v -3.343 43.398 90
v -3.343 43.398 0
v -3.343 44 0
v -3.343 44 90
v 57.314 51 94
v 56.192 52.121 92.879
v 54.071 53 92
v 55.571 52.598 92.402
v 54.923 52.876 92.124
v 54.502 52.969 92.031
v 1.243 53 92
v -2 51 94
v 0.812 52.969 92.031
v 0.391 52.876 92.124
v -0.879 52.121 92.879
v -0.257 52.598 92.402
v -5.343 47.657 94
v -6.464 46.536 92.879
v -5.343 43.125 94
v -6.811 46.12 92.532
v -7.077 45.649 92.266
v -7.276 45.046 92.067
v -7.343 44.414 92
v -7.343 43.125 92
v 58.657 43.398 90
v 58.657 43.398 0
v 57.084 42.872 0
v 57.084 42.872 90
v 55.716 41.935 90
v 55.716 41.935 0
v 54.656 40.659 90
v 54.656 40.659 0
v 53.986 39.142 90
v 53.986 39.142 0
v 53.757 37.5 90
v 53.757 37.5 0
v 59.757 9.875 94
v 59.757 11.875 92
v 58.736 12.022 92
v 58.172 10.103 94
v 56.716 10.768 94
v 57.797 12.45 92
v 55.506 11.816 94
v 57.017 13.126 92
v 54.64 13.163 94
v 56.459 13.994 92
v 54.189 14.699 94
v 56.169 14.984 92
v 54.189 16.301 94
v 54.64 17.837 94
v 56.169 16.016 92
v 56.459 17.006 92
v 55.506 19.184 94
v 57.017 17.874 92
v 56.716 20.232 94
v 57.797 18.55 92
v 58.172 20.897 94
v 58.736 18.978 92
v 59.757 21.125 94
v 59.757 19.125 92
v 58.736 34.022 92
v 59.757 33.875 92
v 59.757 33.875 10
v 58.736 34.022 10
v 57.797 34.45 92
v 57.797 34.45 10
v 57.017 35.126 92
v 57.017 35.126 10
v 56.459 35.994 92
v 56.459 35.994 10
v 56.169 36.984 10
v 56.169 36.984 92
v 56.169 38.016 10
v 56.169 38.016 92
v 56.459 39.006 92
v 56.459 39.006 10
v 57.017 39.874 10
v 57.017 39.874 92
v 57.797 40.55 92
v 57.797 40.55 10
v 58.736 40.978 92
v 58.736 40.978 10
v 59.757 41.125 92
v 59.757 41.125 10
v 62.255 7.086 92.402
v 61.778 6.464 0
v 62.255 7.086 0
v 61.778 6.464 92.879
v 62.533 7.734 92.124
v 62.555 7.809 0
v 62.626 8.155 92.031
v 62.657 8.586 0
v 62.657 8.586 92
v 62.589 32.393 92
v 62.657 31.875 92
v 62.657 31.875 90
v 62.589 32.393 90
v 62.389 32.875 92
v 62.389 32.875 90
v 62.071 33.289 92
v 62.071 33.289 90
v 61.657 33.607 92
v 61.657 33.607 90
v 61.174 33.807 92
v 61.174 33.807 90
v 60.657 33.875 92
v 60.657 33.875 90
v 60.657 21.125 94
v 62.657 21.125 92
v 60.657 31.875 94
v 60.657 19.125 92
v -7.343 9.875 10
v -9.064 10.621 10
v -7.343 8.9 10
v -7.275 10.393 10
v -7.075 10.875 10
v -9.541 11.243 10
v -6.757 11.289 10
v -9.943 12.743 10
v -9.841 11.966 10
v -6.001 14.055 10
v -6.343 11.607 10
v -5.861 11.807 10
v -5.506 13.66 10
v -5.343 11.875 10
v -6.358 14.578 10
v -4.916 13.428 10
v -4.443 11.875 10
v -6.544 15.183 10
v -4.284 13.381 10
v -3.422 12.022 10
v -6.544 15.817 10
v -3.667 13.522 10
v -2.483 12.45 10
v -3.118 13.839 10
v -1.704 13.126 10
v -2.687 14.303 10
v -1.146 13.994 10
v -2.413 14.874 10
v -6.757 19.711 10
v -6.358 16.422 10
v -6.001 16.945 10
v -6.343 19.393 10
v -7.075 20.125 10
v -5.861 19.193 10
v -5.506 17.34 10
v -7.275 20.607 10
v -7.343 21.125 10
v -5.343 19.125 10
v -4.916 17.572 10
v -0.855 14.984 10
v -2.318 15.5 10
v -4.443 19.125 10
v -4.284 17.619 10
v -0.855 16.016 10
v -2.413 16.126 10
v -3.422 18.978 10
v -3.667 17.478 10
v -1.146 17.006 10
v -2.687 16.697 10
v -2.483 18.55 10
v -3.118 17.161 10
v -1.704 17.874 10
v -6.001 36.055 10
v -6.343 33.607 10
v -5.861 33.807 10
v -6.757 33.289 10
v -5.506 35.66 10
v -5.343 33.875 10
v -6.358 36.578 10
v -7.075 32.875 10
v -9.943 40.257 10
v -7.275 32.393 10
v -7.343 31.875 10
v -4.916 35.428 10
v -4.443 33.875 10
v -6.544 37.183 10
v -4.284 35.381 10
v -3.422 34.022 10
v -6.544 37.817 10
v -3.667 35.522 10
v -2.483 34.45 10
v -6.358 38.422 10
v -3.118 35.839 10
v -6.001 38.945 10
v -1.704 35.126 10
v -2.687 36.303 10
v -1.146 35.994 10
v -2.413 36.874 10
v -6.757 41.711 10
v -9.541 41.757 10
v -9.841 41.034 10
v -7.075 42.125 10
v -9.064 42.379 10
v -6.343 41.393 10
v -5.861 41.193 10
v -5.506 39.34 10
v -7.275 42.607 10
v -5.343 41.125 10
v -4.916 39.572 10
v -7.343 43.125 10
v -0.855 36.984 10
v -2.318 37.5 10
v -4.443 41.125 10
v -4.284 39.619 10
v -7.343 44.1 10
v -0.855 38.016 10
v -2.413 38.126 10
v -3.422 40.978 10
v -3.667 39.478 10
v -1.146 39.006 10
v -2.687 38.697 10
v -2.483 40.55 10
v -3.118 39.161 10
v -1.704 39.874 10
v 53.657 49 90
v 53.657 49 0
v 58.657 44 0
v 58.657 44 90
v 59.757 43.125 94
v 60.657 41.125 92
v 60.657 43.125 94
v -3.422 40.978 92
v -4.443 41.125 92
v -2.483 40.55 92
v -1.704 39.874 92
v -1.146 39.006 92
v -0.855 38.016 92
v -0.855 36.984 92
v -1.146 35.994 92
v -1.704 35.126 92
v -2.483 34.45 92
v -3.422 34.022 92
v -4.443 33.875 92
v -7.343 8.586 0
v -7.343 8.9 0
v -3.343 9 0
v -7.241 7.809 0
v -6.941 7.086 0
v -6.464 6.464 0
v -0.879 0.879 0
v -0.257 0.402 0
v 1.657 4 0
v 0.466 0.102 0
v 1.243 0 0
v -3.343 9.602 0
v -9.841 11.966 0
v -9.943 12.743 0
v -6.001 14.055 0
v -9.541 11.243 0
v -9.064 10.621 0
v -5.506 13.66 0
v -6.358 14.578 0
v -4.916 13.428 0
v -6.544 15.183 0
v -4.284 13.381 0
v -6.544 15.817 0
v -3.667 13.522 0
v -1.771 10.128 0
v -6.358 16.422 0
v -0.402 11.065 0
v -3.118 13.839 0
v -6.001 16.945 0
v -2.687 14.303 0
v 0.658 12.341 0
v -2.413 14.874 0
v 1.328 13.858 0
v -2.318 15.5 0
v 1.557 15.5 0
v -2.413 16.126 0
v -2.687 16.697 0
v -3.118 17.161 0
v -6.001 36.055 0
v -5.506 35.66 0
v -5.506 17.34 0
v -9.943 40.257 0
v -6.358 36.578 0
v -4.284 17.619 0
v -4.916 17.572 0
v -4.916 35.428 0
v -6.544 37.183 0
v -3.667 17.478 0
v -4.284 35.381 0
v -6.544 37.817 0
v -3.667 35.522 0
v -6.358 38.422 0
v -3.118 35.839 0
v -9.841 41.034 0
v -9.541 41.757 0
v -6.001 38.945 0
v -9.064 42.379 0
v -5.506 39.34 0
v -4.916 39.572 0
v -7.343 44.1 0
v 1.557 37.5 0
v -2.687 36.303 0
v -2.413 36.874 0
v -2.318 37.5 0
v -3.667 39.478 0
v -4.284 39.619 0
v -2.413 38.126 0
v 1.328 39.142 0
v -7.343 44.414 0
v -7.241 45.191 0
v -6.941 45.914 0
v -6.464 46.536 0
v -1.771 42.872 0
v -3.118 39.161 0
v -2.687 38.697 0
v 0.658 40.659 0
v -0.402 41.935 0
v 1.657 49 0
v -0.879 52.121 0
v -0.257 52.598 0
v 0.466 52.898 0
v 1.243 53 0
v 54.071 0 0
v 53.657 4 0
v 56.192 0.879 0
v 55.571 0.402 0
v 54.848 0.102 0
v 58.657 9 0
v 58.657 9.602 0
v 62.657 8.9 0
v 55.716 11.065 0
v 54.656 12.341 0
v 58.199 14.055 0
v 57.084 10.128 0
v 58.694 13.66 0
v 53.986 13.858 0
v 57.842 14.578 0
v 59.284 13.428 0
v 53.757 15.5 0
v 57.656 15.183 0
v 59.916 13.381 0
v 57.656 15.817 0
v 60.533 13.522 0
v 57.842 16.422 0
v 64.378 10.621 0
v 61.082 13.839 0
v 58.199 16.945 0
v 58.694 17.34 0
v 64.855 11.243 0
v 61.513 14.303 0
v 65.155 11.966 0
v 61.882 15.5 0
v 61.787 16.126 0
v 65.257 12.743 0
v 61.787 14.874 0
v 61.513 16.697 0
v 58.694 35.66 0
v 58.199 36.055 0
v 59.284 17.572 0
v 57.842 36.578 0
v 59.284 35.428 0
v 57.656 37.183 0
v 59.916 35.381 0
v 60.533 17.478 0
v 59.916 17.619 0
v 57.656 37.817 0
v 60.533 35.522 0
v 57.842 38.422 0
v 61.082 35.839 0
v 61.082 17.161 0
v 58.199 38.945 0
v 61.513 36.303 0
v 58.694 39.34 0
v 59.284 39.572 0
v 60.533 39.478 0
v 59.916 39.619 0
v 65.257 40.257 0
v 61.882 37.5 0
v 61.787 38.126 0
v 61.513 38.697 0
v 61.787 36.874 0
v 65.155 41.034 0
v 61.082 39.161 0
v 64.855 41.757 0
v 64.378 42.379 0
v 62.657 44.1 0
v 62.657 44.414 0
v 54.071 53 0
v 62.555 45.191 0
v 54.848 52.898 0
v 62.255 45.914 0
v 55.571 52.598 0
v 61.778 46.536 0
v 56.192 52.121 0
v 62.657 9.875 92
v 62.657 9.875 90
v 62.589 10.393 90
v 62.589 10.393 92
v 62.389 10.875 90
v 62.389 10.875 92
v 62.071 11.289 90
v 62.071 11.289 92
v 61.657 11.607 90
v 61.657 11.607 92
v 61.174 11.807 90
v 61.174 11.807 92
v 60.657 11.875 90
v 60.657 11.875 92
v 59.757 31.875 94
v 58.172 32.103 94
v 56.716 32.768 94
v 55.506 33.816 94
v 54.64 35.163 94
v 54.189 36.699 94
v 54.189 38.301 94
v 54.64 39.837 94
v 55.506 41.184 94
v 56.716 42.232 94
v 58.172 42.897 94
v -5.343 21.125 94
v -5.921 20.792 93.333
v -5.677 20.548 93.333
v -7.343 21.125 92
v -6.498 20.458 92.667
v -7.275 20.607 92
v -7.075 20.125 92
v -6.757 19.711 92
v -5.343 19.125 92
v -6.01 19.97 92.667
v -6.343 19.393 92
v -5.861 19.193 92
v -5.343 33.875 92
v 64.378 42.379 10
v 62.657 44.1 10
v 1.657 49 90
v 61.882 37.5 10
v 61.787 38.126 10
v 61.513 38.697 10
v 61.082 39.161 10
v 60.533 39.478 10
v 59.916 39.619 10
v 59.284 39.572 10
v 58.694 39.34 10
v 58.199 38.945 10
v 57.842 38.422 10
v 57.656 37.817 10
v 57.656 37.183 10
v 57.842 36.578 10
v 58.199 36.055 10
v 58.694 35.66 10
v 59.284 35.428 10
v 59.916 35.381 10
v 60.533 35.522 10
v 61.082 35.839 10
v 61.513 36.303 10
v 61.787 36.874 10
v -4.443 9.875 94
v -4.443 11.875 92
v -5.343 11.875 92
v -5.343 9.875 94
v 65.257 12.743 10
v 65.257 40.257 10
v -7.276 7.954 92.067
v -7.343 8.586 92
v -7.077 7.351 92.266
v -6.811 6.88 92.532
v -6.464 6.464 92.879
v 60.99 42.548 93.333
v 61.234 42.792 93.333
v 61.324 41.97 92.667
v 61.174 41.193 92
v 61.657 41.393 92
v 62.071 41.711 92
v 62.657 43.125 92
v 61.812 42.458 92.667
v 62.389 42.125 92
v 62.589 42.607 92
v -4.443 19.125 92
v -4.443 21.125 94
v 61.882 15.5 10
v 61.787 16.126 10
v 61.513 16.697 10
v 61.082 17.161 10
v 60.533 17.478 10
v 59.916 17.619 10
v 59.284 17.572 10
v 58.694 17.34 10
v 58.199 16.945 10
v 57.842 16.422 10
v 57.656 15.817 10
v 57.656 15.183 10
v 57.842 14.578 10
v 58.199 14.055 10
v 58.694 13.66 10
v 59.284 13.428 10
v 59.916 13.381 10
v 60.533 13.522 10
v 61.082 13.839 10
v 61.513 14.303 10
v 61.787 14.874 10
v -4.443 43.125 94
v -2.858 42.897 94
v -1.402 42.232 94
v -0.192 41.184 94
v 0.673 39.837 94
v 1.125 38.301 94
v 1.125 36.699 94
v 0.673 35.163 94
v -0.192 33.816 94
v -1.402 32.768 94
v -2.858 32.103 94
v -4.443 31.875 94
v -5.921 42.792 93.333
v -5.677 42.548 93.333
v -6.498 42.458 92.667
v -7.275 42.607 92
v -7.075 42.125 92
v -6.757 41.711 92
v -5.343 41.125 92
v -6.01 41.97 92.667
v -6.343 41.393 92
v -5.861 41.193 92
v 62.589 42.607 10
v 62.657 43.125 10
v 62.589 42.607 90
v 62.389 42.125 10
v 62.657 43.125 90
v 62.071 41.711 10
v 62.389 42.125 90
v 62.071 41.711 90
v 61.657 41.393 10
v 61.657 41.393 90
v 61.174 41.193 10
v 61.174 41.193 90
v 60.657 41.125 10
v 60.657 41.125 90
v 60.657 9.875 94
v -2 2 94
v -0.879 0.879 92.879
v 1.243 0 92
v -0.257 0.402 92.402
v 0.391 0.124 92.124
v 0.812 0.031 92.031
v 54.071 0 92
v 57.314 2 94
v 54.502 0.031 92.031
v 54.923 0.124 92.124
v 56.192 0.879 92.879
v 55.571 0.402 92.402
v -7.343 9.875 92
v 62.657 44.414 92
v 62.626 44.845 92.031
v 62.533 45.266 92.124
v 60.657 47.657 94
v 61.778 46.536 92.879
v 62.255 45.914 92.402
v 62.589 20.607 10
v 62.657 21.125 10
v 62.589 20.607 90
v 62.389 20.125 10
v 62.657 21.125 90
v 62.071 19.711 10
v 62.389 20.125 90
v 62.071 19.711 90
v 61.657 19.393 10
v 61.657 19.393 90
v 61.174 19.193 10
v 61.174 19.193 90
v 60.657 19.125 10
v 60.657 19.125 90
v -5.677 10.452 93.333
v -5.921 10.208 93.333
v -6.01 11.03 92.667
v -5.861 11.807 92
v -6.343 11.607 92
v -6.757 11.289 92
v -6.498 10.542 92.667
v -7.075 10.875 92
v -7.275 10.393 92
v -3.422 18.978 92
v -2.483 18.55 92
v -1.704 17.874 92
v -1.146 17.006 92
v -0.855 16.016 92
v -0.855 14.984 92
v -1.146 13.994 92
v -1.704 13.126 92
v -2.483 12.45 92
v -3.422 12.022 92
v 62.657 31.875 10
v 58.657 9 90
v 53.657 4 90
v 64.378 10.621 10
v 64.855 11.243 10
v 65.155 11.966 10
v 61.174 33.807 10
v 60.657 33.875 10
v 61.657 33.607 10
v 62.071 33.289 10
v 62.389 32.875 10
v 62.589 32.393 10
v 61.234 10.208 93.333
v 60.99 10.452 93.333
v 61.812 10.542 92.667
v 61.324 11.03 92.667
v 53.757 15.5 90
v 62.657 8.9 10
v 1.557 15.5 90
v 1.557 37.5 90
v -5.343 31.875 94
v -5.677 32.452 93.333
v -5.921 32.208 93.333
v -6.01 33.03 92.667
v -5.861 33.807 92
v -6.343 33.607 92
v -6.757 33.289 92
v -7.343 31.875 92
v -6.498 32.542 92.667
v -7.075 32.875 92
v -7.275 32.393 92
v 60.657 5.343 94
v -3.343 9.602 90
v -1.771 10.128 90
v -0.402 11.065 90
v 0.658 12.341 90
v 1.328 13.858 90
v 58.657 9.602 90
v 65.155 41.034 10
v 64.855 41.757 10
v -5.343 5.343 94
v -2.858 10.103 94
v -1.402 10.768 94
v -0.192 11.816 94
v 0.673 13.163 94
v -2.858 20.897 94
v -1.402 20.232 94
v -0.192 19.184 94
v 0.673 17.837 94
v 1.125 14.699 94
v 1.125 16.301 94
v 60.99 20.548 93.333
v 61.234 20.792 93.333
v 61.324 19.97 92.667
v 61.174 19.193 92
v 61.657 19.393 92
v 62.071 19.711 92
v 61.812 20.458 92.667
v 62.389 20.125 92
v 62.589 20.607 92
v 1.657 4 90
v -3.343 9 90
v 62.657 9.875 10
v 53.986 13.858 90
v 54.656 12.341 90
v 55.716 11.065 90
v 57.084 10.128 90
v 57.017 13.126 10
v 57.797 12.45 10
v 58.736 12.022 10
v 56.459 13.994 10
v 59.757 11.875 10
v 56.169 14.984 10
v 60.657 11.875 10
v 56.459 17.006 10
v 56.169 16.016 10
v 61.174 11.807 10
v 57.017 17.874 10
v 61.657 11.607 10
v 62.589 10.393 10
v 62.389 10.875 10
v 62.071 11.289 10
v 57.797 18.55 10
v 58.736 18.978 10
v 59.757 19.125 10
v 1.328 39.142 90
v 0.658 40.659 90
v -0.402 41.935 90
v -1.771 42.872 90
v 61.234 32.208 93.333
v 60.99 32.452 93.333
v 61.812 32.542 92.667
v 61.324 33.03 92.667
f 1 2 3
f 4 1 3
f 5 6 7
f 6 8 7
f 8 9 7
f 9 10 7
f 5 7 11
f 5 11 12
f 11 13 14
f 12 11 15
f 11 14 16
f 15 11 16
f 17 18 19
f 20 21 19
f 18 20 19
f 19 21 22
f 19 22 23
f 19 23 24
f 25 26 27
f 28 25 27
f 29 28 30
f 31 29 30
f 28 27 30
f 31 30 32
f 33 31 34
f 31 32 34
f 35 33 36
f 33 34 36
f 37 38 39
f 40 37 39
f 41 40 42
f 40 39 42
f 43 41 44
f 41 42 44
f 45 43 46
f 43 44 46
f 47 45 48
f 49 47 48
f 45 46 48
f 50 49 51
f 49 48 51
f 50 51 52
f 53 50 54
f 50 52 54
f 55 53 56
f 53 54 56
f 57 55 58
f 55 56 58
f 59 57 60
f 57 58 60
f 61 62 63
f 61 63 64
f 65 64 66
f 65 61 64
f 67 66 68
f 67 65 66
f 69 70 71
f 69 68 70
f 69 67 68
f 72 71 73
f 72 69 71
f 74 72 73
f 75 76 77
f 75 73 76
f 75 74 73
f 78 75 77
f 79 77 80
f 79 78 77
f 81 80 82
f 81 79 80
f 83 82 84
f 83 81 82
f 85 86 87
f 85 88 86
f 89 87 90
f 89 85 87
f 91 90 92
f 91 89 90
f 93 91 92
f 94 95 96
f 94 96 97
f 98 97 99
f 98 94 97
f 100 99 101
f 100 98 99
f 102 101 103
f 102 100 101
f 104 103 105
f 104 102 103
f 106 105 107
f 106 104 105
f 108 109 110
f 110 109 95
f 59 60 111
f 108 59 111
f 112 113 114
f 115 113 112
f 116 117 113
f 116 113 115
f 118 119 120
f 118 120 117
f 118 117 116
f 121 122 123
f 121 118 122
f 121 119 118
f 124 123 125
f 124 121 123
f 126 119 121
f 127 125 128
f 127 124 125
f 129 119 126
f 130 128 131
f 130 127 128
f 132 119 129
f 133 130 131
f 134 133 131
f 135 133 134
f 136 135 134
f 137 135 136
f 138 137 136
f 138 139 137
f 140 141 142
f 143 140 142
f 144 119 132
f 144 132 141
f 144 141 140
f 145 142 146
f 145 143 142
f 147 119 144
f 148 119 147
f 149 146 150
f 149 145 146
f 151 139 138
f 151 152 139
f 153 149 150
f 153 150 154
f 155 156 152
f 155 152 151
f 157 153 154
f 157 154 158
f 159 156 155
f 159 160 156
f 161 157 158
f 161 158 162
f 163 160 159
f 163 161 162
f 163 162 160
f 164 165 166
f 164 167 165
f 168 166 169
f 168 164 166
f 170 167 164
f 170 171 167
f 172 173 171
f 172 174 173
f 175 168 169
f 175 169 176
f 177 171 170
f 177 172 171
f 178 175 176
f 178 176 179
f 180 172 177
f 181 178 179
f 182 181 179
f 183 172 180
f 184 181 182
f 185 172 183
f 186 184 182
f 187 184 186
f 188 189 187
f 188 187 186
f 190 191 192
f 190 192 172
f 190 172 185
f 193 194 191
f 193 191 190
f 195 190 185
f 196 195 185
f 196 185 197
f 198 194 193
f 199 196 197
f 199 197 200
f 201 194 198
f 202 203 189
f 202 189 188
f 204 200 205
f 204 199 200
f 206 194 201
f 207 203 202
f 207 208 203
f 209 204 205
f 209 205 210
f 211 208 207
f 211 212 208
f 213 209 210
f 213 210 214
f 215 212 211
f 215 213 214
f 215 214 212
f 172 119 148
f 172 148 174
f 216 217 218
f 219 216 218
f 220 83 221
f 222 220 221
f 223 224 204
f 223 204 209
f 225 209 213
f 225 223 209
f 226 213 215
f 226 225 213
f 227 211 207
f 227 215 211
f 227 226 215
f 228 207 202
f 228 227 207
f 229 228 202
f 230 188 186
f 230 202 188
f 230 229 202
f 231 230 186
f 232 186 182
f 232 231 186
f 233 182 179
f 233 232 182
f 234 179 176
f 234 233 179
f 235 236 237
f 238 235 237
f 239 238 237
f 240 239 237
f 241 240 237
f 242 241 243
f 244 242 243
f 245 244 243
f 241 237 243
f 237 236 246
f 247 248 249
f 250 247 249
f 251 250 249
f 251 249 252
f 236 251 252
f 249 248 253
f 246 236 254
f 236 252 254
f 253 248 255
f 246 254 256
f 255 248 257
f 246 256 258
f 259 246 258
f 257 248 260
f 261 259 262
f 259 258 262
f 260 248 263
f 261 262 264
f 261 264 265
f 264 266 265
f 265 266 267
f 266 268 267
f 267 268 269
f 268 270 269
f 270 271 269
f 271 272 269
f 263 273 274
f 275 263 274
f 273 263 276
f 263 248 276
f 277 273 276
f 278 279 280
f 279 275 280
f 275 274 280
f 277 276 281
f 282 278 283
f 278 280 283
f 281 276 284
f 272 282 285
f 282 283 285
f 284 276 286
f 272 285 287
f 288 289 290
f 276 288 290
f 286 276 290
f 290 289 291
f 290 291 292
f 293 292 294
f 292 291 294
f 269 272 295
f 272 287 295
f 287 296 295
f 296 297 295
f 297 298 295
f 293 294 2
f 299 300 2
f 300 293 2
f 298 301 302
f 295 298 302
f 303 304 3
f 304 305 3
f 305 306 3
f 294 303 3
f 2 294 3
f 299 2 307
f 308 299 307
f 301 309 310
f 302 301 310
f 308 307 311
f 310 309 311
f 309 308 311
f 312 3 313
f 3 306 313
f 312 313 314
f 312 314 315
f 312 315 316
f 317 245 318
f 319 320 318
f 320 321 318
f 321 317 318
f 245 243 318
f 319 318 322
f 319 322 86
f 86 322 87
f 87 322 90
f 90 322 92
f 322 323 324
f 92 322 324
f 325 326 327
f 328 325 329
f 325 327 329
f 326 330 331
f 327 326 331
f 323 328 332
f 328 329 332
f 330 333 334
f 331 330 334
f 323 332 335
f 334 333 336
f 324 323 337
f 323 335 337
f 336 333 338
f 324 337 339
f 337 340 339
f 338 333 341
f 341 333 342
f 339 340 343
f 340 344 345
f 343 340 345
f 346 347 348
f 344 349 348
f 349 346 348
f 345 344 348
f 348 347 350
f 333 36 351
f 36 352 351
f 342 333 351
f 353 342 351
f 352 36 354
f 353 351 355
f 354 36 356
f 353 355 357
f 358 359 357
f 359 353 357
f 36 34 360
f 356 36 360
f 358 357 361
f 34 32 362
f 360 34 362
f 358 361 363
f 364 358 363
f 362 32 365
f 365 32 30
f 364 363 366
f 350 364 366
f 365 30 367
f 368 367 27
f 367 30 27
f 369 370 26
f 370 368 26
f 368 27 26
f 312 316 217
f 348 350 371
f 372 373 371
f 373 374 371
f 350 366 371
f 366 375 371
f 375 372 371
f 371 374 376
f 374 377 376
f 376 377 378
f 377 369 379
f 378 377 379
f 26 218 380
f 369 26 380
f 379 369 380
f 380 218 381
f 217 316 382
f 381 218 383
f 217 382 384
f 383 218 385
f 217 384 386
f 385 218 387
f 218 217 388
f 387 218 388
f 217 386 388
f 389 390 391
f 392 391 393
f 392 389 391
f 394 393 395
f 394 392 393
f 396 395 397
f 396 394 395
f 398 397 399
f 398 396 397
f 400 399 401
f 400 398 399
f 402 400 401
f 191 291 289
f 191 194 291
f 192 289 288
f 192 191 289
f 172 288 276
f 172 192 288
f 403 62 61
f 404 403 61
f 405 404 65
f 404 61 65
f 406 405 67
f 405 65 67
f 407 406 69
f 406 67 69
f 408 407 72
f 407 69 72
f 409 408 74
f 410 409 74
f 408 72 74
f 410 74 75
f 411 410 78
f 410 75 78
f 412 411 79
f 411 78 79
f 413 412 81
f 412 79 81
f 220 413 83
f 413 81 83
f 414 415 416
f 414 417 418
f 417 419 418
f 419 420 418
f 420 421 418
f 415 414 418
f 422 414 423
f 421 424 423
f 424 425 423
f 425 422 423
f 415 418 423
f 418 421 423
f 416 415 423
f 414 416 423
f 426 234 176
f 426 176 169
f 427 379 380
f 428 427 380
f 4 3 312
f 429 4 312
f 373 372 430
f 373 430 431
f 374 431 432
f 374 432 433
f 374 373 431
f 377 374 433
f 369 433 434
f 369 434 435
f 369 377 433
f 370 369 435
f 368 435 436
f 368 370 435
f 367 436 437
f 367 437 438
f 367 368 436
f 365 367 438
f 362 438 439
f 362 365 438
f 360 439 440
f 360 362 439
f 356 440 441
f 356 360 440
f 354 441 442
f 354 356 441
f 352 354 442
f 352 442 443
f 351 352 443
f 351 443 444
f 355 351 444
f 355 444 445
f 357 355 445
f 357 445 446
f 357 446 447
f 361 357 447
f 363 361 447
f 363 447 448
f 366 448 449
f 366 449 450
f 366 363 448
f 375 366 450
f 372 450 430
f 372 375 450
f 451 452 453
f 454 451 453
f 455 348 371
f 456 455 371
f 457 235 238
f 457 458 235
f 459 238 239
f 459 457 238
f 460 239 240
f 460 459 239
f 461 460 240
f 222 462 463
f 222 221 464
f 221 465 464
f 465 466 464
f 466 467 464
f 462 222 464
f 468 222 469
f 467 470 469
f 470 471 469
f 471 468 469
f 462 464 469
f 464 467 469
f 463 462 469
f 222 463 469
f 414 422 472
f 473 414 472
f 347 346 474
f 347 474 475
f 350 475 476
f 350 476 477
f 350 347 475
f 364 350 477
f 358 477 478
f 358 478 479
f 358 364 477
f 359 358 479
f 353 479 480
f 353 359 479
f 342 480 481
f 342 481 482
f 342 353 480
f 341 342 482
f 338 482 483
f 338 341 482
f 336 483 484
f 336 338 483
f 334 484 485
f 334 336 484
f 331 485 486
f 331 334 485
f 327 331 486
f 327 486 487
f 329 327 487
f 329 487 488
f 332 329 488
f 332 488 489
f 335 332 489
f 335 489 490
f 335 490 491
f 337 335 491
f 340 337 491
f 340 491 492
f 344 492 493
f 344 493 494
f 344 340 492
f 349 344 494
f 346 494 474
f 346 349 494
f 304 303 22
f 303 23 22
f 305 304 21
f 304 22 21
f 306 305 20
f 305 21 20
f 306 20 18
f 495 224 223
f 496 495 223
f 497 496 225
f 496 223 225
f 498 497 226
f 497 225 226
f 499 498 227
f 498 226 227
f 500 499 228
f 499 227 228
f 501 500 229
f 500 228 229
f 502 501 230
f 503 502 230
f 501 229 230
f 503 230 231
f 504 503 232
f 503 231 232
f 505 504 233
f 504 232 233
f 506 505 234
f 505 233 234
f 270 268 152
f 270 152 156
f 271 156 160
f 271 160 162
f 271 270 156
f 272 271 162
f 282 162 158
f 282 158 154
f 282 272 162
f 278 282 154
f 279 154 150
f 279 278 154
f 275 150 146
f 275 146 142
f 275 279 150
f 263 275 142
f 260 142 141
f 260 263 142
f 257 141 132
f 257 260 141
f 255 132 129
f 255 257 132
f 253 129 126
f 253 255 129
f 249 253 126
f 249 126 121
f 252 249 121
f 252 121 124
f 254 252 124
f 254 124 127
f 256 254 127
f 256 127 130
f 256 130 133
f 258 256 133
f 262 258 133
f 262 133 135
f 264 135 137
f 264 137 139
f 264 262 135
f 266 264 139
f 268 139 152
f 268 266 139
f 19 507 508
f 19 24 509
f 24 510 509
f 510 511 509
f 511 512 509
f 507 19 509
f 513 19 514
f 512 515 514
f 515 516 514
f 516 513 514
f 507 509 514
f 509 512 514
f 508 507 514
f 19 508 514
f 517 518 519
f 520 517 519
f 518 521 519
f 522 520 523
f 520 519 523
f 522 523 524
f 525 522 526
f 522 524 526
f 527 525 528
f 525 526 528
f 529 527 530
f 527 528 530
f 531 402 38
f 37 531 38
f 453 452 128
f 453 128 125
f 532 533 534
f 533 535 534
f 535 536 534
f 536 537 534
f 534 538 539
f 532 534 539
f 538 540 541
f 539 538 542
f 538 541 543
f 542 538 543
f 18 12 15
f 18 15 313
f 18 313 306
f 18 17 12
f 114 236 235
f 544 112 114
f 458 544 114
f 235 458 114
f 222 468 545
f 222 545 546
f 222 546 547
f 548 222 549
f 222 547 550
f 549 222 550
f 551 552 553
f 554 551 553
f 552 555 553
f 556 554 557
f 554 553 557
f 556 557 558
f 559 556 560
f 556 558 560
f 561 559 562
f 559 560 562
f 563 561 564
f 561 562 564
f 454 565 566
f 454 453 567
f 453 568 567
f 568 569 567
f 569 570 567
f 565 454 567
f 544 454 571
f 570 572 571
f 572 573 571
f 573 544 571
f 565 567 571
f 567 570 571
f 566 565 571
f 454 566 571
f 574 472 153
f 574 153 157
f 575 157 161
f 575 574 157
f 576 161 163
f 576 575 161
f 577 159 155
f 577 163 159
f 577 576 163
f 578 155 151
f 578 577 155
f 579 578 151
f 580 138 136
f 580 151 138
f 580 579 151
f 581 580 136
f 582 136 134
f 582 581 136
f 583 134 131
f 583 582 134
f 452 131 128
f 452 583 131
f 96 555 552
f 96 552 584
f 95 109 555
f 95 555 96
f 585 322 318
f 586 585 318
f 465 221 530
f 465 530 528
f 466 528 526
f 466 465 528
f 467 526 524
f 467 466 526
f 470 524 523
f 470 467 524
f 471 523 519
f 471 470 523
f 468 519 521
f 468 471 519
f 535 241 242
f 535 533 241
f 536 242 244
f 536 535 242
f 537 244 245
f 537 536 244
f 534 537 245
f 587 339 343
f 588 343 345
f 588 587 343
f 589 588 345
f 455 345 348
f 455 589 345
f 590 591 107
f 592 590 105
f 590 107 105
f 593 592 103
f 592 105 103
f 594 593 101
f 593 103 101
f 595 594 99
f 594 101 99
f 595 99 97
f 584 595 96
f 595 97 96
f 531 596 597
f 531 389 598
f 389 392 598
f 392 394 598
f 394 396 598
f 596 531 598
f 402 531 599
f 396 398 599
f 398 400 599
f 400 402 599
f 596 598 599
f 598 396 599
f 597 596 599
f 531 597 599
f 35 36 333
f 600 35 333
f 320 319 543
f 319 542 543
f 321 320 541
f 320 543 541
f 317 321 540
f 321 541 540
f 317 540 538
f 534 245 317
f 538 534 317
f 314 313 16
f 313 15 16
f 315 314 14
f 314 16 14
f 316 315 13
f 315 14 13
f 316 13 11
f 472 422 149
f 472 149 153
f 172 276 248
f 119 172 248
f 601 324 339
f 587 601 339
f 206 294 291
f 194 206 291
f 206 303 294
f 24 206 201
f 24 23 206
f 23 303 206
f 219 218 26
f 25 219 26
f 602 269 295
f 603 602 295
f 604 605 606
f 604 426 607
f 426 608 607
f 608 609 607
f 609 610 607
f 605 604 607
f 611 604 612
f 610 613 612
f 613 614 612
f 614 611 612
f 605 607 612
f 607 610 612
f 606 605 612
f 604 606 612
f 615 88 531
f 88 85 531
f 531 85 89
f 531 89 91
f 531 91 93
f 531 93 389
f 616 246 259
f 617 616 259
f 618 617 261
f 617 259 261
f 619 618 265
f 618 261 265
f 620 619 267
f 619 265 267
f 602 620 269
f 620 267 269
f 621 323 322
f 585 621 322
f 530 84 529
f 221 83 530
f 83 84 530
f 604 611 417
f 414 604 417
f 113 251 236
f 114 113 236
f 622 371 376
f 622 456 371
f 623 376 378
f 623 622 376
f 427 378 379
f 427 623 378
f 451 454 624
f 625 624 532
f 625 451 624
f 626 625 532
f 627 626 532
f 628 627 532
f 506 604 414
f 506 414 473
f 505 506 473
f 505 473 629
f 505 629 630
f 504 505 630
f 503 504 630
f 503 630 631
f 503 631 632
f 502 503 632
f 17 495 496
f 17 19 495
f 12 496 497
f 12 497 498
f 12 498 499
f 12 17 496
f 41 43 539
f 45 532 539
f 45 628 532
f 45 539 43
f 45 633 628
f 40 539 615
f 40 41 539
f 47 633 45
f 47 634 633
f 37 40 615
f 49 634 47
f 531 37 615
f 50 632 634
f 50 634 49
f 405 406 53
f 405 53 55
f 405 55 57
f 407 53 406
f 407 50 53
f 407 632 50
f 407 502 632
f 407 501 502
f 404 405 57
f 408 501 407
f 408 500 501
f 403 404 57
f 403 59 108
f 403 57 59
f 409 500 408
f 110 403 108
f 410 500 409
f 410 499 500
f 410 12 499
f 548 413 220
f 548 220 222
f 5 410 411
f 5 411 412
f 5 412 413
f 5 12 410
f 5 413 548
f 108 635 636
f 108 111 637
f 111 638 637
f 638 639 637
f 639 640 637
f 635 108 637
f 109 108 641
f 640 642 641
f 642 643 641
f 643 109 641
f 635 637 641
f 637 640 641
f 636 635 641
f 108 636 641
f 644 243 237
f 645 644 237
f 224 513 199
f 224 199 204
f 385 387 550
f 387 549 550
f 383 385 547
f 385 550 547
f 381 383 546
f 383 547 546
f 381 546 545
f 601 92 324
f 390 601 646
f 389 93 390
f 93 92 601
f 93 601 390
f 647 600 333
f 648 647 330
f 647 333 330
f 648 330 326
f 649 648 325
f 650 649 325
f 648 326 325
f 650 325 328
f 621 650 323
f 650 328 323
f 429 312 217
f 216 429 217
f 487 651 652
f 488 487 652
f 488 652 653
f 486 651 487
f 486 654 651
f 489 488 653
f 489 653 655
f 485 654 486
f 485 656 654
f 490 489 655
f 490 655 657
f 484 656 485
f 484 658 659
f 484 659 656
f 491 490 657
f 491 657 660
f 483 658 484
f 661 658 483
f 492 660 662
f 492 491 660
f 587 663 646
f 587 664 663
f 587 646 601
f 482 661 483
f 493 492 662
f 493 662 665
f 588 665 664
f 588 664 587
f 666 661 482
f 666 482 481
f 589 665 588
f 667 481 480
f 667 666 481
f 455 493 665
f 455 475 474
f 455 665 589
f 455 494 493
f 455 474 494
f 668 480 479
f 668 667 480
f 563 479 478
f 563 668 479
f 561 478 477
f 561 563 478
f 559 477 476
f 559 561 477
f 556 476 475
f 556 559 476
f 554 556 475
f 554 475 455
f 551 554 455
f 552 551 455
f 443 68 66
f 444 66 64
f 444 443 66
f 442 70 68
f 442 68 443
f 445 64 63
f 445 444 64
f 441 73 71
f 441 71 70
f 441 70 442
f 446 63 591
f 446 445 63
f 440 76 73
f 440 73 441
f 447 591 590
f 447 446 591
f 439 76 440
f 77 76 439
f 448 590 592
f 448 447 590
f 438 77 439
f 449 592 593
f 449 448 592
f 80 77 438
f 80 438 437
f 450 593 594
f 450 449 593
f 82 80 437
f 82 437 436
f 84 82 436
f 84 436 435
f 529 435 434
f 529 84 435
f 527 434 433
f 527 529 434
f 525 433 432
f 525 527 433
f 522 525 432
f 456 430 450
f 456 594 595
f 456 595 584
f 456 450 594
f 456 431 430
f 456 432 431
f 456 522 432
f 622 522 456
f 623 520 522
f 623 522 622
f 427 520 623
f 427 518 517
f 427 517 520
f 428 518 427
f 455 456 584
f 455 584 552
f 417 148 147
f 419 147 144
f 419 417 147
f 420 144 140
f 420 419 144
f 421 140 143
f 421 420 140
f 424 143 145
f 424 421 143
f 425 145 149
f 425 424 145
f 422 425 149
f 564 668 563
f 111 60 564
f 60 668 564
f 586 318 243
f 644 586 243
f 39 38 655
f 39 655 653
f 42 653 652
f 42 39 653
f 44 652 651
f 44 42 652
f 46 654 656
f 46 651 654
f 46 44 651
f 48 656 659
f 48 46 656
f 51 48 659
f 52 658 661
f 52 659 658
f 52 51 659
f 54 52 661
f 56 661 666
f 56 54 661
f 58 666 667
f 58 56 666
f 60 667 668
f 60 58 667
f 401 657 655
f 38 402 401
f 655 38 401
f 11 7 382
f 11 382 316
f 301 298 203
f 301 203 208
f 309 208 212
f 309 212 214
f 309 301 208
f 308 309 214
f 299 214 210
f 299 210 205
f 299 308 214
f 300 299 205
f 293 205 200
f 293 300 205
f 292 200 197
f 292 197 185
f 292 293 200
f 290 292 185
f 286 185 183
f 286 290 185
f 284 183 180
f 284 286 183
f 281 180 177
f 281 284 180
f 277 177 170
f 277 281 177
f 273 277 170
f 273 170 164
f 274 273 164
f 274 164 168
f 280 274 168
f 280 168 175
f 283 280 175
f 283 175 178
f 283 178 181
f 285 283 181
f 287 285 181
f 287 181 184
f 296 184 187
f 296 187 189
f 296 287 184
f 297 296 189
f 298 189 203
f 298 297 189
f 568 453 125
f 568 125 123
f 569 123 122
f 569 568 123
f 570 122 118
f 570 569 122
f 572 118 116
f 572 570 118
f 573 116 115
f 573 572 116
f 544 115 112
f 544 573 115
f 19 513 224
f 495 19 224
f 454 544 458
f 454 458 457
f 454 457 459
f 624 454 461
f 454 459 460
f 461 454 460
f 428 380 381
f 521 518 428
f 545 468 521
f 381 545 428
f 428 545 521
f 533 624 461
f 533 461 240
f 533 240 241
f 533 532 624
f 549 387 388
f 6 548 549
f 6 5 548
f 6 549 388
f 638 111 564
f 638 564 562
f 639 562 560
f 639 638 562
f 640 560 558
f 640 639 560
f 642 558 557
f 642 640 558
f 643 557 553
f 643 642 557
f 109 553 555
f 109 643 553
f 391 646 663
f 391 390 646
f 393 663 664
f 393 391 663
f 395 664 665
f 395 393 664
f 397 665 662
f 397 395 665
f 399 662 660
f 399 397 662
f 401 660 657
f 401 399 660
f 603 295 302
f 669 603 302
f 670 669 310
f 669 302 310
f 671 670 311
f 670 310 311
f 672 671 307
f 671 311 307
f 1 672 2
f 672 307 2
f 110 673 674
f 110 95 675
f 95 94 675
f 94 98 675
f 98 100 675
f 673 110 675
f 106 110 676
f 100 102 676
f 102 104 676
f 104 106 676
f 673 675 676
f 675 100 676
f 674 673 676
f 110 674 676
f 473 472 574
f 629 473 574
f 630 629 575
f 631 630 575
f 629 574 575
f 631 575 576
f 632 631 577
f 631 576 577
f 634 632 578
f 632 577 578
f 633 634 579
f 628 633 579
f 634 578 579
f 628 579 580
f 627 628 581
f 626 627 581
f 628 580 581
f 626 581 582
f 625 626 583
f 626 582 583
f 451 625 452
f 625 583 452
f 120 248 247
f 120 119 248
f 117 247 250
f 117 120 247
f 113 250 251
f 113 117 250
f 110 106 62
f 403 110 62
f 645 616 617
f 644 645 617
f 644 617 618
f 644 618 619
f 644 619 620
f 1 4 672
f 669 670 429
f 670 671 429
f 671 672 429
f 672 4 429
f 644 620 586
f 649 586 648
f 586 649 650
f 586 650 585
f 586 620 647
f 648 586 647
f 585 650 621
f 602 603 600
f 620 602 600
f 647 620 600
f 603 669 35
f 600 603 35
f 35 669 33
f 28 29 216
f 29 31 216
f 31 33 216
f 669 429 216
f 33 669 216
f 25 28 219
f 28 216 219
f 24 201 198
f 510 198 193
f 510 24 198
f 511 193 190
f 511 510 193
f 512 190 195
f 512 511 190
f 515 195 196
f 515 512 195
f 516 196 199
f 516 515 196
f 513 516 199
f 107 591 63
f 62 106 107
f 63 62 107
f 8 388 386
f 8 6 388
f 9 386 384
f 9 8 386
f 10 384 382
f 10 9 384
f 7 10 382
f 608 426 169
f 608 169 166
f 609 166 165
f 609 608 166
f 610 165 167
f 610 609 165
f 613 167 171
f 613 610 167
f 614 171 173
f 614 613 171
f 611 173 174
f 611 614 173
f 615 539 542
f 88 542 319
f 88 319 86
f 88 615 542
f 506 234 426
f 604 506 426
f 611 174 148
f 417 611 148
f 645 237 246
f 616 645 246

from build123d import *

# Parameters (mm, degrees)
BOSS_EXTRUDE1_DEPTH = 90
SKETCH1_3_R         = 2.125
BOSS_EXTRUDE2_DEPTH = 10
FILLET1_R           = 2
BOSS_EXTRUDE3_START = 4
BOSS_EXTRUDE3_DEPTH = 4
CHAMFER1_SIZE       = 2
FILLET3_R           = 3


with BuildPart() as part:
    # Sketch1 → Boss-Extrude1 (new body)
    with BuildSketch(Plane.XY):
        with BuildLine():
            Line((55.313708499, 53), (0, 53))
            Line((0, 53), (-7.343145751, 45.656854249))
            Line((-7.343145751, 45.656854249), (-7.343145751, 41.125))
            Line((-7.343145751, 41.125), (-4.443145751, 41.125))
            ThreePointArc((-4.443145751, 41.125), (-0.818145751, 37.5), (-4.443145751, 33.875))
            Line((-4.443145751, 33.875), (-7.343145751, 33.875))
            Line((-7.343145751, 33.875), (-7.343145751, 19.125))
            Line((-7.343145751, 19.125), (-4.443145751, 19.125))
            ThreePointArc((-4.443145751, 19.125), (-0.818145751, 15.5), (-4.443145751, 11.875))
            Line((-4.443145751, 11.875), (-7.343145751, 11.875))
            Line((-7.343145751, 11.875), (-7.343145751, 7.343145751))
            Line((-7.343145751, 7.343145751), (0, 0))
            Line((0, 0), (55.313708499, 0))
            Line((55.313708499, 0), (62.656854249, 7.343145751))
            Line((62.656854249, 7.343145751), (62.656854249, 11.875))
            Line((62.656854249, 11.875), (59.756854249, 11.875))
            ThreePointArc((59.756854249, 11.875), (56.131854249, 15.5), (59.756854249, 19.125))
            Line((59.756854249, 19.125), (62.656854249, 19.125))
            Line((62.656854249, 19.125), (62.656854249, 33.875))
            Line((62.656854249, 33.875), (59.756854249, 33.875))
            ThreePointArc((59.756854249, 33.875), (56.131854249, 37.5), (59.756854249, 41.125))
            Line((59.756854249, 41.125), (62.656854249, 41.125))
            Line((62.656854249, 41.125), (62.656854249, 45.656854249))
            Line((62.656854249, 45.656854249), (55.313708499, 53))
        make_face()
        with BuildLine():
            Line((53.656854249, 4), (1.656854249, 4))
            Line((1.656854249, 4), (-3.343145751, 9))
            Line((-3.343145751, 9), (-3.343145751, 9.601695159))
            ThreePointArc((-3.343145751, 9.601695159), (0.172046553, 11.665942097), (1.556854249, 15.5))
            Line((1.556854249, 15.5), (1.556854249, 37.5))
            ThreePointArc((1.556854249, 37.5), (0.172046553, 41.334057903), (-3.343145751, 43.398304841))
            Line((-3.343145751, 43.398304841), (-3.343145751, 44))
            Line((-3.343145751, 44), (1.656854249, 49))
            Line((1.656854249, 49), (53.656854249, 49))
            Line((53.656854249, 49), (58.656854249, 44))
            Line((58.656854249, 44), (58.656854249, 43.398304841))
            ThreePointArc((58.656854249, 43.398304841), (55.141661946, 41.334057903), (53.756854249, 37.5))
            Line((53.756854249, 37.5), (53.756854249, 15.5))
            ThreePointArc((53.756854249, 15.5), (55.141661946, 11.665942097), (58.656854249, 9.601695159))
            Line((58.656854249, 9.601695159), (58.656854249, 9))
            Line((58.656854249, 9), (53.656854249, 4))
        make_face(mode=Mode.SUBTRACT)
    extrude(amount=BOSS_EXTRUDE1_DEPTH)

    # Sketch1<3> → Boss-Extrude2 (add)
    # profile 1 of 2: a face of its own
    with BuildSketch(Plane.XY):
        with BuildLine():
            ThreePointArc((-4.443145751, 33.875), (-0.818145751, 37.5), (-4.443145751, 41.125))
            Line((-4.443145751, 41.125), (-7.343145751, 41.125))
            Line((-7.343145751, 41.125), (-7.343145751, 44.1))
            Line((-7.343145751, 44.1), (-9.943145751, 41.5))
            Line((-9.943145751, 41.5), (-9.943145751, 11.5))
            Line((-9.943145751, 11.5), (-7.343145751, 8.9))
            Line((-7.343145751, 8.9), (-7.343145751, 11.875))
            Line((-7.343145751, 11.875), (-4.443145751, 11.875))
            ThreePointArc((-4.443145751, 11.875), (-0.818145751, 15.5), (-4.443145751, 19.125))
            Line((-4.443145751, 19.125), (-7.343145751, 19.125))
            Line((-7.343145751, 19.125), (-7.343145751, 33.875))
            Line((-7.343145751, 33.875), (-4.443145751, 33.875))
        make_face()
        with Locations((-4.443145751, 15.5)):
            Circle(SKETCH1_3_R, mode=Mode.SUBTRACT)
        with Locations((-4.443145751, 37.5)):
            Circle(SKETCH1_3_R, mode=Mode.SUBTRACT)
    # profile 2 of 2: a face of its own
    with BuildSketch(Plane.XY):
        with BuildLine():
            Line((65.256854249, 41.5), (62.656854249, 44.1))
            Line((62.656854249, 44.1), (62.656854249, 41.125))
            Line((62.656854249, 41.125), (59.756854249, 41.125))
            ThreePointArc((59.756854249, 41.125), (56.131854249, 37.5), (59.756854249, 33.875))
            Line((59.756854249, 33.875), (62.656854249, 33.875))
            Line((62.656854249, 33.875), (62.656854249, 19.125))
            Line((62.656854249, 19.125), (59.756854249, 19.125))
            ThreePointArc((59.756854249, 19.125), (56.131854249, 15.5), (59.756854249, 11.875))
            Line((59.756854249, 11.875), (62.656854249, 11.875))
            Line((62.656854249, 11.875), (62.656854249, 8.9))
            Line((62.656854249, 8.9), (65.256854249, 11.5))
            Line((65.256854249, 11.5), (65.256854249, 41.5))
        make_face()
        with Locations((59.756854249, 37.5)):
            Circle(SKETCH1_3_R, mode=Mode.SUBTRACT)
        with Locations((59.756854249, 15.5)):
            Circle(SKETCH1_3_R, mode=Mode.SUBTRACT)
    extrude(amount=BOSS_EXTRUDE2_DEPTH)

    # Fillet1
    fillet1_edges = [part.edges().sort_by_distance(p)[0] for p in [
        (62.656854249, 41.125, 50),
        (62.656854249, 33.875, 50),
        (62.656854249, 19.125, 50),
        (62.656854249, 11.875, 50),
        (-7.343145751, 11.875, 50),
        (-7.343145751, 19.125, 50),
        (-7.343145751, 33.875, 50),
        (-7.343145751, 41.125, 50),
    ]]
    fillet(fillet1_edges, radius=FILLET1_R)

    # Sketch2 → Boss-Extrude3 (add)
    with BuildSketch(Plane.XY.offset(90).offset(BOSS_EXTRUDE3_START)):
        with BuildLine():
            Line((-7.343145751, 31.875), (-7.343145751, 21.125))
            ThreePointArc((-7.343145751, 21.125), (-6.757359313, 19.710786438), (-5.343145751, 19.125))
            Line((-5.343145751, 19.125), (-4.443145751, 19.125))
            ThreePointArc((-4.443145751, 19.125), (-0.818145751, 15.5), (-4.443145751, 11.875))
            Line((-4.443145751, 11.875), (-5.343145751, 11.875))
            ThreePointArc((-5.343145751, 11.875), (-6.757359313, 11.289213562), (-7.343145751, 9.875))
            Line((-7.343145751, 9.875), (-7.343145751, 7.343145751))
            Line((-7.343145751, 7.343145751), (0, 0))
            Line((0, 0), (55.313708499, 0))
            Line((55.313708499, 0), (62.656854249, 7.343145751))
            Line((62.656854249, 7.343145751), (62.656854249, 9.875))
            ThreePointArc((62.656854249, 9.875), (62.071067812, 11.289213562), (60.656854249, 11.875))
            Line((60.656854249, 11.875), (59.756854249, 11.875))
            ThreePointArc((59.756854249, 11.875), (56.131854249, 15.5), (59.756854249, 19.125))
            Line((59.756854249, 19.125), (60.656854249, 19.125))
            ThreePointArc((60.656854249, 19.125), (62.071067812, 19.710786438), (62.656854249, 21.125))
            Line((62.656854249, 21.125), (62.656854249, 31.875))
            ThreePointArc((62.656854249, 31.875), (62.071067812, 33.289213562), (60.656854249, 33.875))
            Line((60.656854249, 33.875), (59.756854249, 33.875))
            ThreePointArc((59.756854249, 33.875), (56.131854249, 37.5), (59.756854249, 41.125))
            Line((59.756854249, 41.125), (60.656854249, 41.125))
            ThreePointArc((60.656854249, 41.125), (62.071067812, 41.710786438), (62.656854249, 43.125))
            Line((62.656854249, 43.125), (62.656854249, 45.656854249))
            Line((62.656854249, 45.656854249), (55.313708499, 53))
            Line((55.313708499, 53), (0, 53))
            Line((0, 53), (-7.343145751, 45.656854249))
            Line((-7.343145751, 45.656854249), (-7.343145751, 43.125))
            ThreePointArc((-7.343145751, 43.125), (-6.757359313, 41.710786438), (-5.343145751, 41.125))
            Line((-5.343145751, 41.125), (-4.443145751, 41.125))
            ThreePointArc((-4.443145751, 41.125), (-0.818145751, 37.5), (-4.443145751, 33.875))
            Line((-4.443145751, 33.875), (-5.343145751, 33.875))
            ThreePointArc((-5.343145751, 33.875), (-6.757359313, 33.289213562), (-7.343145751, 31.875))
        make_face()
    extrude(amount=-BOSS_EXTRUDE3_DEPTH)

    # Chamfer1
    chamfer1_edges = [part.edges().sort_by_distance(p)[0] for p in [
        (-7.343145751, 44.390927125, 94),
        (-6.757359313, 41.710786438, 94),
        (-4.893145751, 41.125, 94),
        (-0.818145751, 37.5, 94),
        (-4.893145751, 33.875, 94),
        (-6.757359313, 33.289213562, 94),
        (-7.343145751, 26.5, 94),
        (-6.757359313, 19.710786438, 94),
        (-4.893145751, 19.125, 94),
        (-0.818145751, 15.5, 94),
        (-4.893145751, 11.875, 94),
        (-6.757359313, 11.289213562, 94),
        (-7.343145751, 8.609072875, 94),
        (27.656854249, 0, 94),
        (62.656854249, 8.609072875, 94),
        (62.071067812, 11.289213562, 94),
        (60.206854249, 11.875, 94),
        (56.131854249, 15.5, 94),
        (60.206854249, 19.125, 94),
        (62.071067812, 19.710786438, 94),
        (62.656854249, 26.5, 94),
        (62.071067812, 33.289213562, 94),
        (60.206854249, 33.875, 94),
        (56.131854249, 37.5, 94),
        (60.206854249, 41.125, 94),
        (62.071067812, 41.710786438, 94),
        (62.656854249, 44.390927125, 94),
        (27.656854249, 53, 94),
    ]]
    chamfer(chamfer1_edges, length=CHAMFER1_SIZE - 0.0001)  # a hair under: the kernel refuses the full size

    # Fillet3
    fillet3_edges = [part.edges().sort_by_distance(p)[0] for p in [
        (-9.943145751, 41.5, 5),
        (-9.943145751, 11.5, 5),
        (65.256854249, 11.5, 5),
        (65.256854249, 41.5, 5),
        (62.656854249, 7.343145751, 46.00005),
        (55.313708499, 0, 46.00005),
        (0, 0, 46.00005),
        (-7.343145751, 7.343145751, 46.00005),
        (55.313708499, 53, 46.00005),
        (62.656854249, 45.656854249, 46.00005),
        (-7.343145751, 45.656854249, 46.00005),
        (0, 53, 46.00005),
    ]]
    fillet(fillet3_edges, radius=FILLET3_R)


solid = part.part
